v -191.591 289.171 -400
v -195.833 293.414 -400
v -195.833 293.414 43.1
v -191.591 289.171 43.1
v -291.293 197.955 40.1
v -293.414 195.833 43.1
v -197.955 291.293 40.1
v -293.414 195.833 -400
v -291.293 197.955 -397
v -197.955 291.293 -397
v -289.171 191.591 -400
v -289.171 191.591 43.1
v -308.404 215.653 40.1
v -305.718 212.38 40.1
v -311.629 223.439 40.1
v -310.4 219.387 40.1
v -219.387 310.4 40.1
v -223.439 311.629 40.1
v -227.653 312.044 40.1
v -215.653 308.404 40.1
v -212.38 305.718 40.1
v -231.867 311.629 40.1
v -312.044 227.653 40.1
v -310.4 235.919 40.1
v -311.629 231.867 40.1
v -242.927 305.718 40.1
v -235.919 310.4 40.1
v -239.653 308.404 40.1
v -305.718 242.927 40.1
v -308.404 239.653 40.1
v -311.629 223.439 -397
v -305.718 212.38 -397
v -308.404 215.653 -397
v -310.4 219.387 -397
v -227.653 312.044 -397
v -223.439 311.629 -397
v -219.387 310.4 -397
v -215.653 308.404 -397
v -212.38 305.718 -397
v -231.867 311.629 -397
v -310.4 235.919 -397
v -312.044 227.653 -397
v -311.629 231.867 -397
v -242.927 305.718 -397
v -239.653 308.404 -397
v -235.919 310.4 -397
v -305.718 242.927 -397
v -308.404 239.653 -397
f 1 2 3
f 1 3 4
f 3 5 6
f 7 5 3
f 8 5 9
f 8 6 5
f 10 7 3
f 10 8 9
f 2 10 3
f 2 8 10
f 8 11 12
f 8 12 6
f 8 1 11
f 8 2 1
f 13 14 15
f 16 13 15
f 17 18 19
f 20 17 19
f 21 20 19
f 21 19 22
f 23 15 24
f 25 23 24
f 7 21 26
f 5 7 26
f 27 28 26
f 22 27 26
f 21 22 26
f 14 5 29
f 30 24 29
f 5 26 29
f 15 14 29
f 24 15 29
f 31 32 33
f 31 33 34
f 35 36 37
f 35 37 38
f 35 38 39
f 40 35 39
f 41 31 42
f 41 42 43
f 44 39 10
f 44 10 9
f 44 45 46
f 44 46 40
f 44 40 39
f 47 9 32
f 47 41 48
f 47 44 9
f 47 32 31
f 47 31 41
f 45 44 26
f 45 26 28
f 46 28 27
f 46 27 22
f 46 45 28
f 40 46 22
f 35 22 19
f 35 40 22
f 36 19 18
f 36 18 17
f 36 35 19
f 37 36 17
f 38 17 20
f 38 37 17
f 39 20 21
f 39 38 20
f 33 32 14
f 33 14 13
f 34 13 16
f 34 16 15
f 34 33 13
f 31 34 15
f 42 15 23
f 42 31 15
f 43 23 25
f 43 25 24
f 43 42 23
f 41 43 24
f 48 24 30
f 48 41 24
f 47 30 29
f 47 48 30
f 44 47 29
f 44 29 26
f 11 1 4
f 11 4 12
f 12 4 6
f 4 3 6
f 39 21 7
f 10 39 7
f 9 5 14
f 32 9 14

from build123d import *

# Parameters (mm, degrees)
COVER_START       = -397
COVER_DEPTH       = 437.1
RAIL_START        = -400
RAIL_FLANGE_DEPTH = 443.1


with BuildPart() as part:
    # Sketch1 → Cover (new body)
    with BuildSketch(Plane.XY.offset(COVER_START)):
        with BuildLine():
            Line((-193.711902706, 287.049997823), (-287.049997823, 193.711902706))
            Line((-287.049997823, 193.711902706), (-305.717616846, 212.379521729))
            ThreePointArc((-305.717616846, 212.379521729), (-312.044110372, 227.653028203), (-305.717616846, 242.926534677))
            Line((-305.717616846, 242.926534677), (-242.926534677, 305.717616846))
            ThreePointArc((-242.926534677, 305.717616846), (-227.653028203, 312.044110372), (-212.379521729, 305.717616846))
            Line((-212.379521729, 305.717616846), (-193.711902706, 287.049997823))
        make_face()
    extrude(amount=COVER_DEPTH)

    # Sketch2 → Rail Flange (add)
    with BuildSketch(Plane.XY.offset(RAIL_START)):
        Polygon((-191.590582362, 289.171318166), (-289.171318166, 191.590582362), (-293.413958853, 195.83322305), (-195.83322305, 293.413958853), align=None)
    extrude(amount=RAIL_FLANGE_DEPTH)


solid = part.part
